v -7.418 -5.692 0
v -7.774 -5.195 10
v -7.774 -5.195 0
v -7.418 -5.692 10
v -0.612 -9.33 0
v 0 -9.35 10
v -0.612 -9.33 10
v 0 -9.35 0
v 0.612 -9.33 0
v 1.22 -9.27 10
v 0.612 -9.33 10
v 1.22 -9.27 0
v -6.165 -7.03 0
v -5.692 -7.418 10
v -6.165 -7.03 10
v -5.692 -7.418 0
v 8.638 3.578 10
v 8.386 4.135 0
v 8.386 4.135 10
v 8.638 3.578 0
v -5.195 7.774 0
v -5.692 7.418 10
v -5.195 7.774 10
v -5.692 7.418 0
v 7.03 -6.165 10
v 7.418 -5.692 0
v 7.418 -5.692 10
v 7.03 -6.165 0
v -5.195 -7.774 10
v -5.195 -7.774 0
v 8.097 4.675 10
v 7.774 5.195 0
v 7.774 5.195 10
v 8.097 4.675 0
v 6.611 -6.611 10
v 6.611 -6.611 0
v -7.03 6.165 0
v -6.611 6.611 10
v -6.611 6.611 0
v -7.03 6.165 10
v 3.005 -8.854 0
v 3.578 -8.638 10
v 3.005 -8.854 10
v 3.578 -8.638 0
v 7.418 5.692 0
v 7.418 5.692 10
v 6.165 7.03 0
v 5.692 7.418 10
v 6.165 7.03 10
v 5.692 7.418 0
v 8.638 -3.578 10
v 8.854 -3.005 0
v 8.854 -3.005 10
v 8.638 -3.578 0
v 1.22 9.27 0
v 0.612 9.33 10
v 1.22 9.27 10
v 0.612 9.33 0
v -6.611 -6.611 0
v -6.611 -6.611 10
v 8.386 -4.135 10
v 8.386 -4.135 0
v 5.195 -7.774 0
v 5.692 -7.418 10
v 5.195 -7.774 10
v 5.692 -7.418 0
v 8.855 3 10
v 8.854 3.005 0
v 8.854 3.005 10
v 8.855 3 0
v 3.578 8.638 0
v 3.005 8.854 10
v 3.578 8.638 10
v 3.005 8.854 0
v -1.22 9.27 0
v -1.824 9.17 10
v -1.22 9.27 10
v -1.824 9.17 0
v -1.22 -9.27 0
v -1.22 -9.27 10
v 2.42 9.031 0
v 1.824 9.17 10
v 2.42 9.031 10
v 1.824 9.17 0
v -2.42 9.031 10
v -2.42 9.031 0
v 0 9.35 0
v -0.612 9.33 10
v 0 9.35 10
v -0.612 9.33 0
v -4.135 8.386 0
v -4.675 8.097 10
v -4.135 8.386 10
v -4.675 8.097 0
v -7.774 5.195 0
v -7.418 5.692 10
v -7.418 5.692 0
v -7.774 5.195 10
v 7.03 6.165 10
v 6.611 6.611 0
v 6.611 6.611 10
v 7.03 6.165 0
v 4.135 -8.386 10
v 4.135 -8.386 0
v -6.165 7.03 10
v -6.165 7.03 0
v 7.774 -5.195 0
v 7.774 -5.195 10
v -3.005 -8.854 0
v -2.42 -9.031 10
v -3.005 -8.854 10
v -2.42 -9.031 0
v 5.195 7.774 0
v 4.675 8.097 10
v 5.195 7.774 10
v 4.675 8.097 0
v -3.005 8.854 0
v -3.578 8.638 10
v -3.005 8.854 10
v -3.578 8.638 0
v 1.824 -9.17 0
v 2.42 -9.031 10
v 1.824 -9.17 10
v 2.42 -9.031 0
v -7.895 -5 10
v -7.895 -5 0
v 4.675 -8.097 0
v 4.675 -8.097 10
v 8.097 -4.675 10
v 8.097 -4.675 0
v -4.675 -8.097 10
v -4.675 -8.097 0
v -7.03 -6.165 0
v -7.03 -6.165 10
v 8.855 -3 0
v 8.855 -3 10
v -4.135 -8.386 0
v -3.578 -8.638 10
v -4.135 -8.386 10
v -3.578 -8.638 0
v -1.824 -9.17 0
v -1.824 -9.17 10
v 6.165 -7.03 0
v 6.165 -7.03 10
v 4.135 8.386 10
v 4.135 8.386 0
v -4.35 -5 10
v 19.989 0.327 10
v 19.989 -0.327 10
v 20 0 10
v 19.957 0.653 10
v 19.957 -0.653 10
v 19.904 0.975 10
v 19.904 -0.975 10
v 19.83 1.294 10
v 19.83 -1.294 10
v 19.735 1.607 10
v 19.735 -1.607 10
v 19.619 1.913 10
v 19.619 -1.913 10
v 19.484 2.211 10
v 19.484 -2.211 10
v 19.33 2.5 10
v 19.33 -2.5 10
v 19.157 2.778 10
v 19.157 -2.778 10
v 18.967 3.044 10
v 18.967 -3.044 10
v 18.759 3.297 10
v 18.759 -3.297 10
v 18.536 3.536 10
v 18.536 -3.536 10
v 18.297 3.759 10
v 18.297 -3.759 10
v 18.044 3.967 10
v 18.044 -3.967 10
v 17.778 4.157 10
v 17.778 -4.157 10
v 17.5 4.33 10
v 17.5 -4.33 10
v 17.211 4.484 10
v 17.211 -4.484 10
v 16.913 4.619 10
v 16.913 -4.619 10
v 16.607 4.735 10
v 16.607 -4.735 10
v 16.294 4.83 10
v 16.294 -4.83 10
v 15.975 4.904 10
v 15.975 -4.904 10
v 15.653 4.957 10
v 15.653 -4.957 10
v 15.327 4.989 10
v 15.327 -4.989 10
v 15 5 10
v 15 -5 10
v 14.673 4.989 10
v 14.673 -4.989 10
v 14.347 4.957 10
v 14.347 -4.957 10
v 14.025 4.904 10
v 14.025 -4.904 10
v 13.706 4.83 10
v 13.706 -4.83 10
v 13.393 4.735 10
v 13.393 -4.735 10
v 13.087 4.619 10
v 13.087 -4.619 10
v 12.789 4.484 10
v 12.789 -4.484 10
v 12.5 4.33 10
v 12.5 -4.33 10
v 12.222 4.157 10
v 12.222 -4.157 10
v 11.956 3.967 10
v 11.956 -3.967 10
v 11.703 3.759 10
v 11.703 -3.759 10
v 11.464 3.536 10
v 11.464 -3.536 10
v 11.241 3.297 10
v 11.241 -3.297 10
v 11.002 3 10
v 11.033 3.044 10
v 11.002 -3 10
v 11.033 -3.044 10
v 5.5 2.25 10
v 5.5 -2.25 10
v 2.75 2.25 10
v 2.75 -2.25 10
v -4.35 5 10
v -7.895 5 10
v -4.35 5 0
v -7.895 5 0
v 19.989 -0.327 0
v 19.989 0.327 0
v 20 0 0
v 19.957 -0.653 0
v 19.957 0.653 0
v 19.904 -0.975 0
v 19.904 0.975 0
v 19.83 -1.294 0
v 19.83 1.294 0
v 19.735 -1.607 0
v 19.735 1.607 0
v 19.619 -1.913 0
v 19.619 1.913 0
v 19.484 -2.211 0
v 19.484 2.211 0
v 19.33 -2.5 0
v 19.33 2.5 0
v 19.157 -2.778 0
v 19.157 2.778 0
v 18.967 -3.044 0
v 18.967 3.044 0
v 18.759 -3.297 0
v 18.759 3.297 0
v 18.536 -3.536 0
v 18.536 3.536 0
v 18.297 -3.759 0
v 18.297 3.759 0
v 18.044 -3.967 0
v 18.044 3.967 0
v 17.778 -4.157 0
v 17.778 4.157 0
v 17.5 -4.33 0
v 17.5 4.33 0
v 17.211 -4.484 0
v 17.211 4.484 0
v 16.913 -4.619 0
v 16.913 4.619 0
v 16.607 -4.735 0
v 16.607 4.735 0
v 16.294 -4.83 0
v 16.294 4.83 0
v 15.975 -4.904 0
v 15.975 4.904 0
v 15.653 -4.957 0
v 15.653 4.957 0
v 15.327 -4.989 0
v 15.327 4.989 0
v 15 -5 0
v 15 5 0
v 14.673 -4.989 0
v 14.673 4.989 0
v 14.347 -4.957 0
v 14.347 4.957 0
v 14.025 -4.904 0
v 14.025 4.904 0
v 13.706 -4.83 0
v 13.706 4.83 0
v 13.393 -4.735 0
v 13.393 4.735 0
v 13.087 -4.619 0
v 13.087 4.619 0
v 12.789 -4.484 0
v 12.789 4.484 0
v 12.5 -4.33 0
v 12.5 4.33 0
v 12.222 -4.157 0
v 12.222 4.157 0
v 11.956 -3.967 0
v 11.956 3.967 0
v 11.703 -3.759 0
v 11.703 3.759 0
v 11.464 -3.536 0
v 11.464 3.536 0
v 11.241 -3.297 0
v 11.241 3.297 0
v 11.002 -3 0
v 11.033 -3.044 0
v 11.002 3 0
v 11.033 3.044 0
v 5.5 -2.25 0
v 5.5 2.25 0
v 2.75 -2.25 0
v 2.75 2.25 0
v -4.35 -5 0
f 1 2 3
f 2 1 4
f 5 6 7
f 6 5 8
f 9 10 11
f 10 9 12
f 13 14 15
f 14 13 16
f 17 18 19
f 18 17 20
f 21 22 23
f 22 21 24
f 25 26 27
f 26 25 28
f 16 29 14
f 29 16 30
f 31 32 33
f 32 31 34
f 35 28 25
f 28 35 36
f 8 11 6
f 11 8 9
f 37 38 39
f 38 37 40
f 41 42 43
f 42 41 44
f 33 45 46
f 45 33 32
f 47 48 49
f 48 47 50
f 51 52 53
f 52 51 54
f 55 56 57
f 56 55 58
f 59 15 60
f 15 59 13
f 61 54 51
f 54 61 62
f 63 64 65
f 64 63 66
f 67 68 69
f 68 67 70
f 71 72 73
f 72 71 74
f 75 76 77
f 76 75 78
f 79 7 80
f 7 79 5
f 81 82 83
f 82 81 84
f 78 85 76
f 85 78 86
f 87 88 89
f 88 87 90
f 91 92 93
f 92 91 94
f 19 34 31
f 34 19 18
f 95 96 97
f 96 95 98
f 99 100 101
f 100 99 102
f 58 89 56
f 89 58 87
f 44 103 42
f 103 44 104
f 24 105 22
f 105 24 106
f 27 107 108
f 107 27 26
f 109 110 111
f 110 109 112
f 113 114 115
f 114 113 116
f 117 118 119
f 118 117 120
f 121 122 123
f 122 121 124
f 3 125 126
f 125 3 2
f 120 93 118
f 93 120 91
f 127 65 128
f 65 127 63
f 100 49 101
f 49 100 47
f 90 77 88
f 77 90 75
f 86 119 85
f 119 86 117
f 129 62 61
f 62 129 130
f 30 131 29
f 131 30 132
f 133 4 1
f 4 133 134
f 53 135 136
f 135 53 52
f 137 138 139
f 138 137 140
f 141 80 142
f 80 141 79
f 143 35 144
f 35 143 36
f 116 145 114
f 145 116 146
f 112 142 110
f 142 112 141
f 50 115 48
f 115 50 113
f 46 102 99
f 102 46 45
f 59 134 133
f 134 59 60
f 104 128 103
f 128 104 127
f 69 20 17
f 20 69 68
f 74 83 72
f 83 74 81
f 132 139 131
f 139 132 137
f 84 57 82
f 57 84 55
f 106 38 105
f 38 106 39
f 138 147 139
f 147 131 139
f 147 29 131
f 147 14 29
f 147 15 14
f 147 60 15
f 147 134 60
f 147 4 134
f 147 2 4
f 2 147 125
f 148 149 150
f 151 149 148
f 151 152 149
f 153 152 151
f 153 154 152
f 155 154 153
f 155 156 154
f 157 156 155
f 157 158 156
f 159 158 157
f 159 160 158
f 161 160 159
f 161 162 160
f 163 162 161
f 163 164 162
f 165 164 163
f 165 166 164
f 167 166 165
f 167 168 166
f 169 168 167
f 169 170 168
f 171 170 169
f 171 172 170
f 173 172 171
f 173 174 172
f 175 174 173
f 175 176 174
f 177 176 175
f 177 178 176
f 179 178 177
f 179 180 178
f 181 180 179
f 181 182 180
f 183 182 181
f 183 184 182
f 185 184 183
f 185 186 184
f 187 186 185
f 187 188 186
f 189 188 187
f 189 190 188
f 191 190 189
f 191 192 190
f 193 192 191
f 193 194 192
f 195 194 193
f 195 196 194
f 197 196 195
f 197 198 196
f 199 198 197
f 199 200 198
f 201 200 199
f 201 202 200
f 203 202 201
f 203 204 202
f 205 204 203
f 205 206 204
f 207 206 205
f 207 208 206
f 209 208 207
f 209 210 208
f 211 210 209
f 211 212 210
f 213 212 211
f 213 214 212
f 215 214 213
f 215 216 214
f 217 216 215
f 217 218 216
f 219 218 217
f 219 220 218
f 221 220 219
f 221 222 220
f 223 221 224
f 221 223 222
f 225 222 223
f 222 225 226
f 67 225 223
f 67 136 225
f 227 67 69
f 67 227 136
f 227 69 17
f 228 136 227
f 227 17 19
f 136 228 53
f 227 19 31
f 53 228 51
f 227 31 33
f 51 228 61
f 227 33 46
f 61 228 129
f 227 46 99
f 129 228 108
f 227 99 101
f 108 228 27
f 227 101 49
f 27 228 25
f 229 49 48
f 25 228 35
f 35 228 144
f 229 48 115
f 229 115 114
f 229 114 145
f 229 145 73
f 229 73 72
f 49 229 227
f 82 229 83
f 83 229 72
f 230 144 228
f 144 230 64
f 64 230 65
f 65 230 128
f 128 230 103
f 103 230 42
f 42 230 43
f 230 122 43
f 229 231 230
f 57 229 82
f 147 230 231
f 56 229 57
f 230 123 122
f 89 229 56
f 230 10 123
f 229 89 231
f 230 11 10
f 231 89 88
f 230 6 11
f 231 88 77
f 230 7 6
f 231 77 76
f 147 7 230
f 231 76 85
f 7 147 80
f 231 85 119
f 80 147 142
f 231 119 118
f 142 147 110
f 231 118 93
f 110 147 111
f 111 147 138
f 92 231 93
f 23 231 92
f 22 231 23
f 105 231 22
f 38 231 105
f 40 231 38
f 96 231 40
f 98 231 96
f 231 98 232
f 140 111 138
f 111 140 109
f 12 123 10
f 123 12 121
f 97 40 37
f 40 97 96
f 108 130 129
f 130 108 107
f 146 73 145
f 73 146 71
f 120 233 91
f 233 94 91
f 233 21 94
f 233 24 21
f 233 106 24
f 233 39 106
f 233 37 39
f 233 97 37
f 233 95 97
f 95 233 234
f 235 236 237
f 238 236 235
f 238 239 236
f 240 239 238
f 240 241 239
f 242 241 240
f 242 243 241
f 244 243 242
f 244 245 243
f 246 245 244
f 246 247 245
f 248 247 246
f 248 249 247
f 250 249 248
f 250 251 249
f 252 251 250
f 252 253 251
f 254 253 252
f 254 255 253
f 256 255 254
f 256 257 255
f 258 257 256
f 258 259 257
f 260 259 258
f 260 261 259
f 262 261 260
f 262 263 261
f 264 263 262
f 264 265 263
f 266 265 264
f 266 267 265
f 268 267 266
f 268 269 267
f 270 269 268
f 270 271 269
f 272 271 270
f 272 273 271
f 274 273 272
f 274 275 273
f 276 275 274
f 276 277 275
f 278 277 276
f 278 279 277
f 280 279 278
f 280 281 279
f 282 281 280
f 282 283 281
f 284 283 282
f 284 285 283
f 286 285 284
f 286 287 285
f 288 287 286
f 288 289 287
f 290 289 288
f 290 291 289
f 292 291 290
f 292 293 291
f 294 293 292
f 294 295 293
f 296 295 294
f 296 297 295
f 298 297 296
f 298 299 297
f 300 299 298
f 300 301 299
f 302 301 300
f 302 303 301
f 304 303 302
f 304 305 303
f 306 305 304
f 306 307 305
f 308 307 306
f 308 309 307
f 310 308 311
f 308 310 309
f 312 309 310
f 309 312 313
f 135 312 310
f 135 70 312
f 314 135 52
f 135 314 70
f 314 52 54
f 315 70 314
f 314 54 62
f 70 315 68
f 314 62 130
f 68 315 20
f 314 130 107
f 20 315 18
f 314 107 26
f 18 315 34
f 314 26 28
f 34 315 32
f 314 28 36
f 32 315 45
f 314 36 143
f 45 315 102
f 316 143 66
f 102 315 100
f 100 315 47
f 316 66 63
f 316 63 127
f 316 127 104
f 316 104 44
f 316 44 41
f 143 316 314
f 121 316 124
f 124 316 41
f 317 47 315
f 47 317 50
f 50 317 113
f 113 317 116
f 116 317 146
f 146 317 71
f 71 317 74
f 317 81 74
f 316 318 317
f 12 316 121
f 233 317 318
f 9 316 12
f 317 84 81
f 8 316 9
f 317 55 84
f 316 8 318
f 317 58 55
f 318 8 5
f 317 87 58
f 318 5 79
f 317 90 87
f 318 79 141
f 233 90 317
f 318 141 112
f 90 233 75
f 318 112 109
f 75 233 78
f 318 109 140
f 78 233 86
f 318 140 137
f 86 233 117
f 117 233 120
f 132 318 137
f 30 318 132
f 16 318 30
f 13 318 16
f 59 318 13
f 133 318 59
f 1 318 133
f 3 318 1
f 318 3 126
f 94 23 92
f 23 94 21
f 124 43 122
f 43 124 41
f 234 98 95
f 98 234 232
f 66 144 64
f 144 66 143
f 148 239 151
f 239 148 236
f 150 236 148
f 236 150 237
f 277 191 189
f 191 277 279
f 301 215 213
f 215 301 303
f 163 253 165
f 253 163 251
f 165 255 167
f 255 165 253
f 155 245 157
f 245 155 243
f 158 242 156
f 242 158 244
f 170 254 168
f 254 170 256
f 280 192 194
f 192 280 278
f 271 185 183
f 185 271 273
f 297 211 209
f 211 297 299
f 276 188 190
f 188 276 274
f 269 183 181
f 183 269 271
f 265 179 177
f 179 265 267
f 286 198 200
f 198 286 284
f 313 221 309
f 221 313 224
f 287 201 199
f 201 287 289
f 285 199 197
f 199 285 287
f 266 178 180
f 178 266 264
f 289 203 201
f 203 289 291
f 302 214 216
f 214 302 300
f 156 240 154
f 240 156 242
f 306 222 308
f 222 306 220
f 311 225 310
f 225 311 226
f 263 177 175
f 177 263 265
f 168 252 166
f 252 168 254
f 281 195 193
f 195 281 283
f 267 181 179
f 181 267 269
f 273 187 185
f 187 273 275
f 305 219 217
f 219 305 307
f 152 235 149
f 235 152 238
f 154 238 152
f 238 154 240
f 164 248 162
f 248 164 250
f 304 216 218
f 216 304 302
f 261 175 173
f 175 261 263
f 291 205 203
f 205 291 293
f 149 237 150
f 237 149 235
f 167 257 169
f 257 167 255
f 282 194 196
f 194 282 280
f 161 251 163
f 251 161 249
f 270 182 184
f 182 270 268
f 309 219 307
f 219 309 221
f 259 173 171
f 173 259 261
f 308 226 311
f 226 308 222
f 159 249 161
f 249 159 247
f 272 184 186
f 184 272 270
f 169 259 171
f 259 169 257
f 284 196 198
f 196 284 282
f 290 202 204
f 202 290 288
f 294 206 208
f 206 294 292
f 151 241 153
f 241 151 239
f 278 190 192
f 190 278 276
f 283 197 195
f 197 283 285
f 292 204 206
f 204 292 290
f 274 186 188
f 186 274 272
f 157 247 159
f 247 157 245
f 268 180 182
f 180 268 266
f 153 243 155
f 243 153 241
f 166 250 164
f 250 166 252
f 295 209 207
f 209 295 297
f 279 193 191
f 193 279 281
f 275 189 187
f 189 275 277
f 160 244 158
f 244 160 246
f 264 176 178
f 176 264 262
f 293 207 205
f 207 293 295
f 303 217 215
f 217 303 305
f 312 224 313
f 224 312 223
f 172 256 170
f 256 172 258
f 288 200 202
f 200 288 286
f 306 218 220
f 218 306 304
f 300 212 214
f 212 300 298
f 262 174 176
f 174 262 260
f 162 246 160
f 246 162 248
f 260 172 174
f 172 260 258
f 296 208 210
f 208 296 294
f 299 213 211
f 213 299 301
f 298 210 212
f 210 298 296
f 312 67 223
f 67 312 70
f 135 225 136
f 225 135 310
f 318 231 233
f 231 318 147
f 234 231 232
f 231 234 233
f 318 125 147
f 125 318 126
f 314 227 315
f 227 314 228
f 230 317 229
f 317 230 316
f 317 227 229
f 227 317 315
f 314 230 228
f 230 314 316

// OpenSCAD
// Snap-on tubing clip for 12.7 mm lab stand rod
// Print orientation: flat on bed, extrusion along +Z

$fn = 96;

// ---- Dimensions (mm) ----
stand_id     = 12.7;   // stand rod inner diameter
stand_wall   = 3;      // stand ring wall thickness
stand_od     = stand_id + 2 * stand_wall;  // 18.7 outer diameter
stand_cut    = 10;     // stand ring opening width (-X side)

tube_id      = 6;      // tubing inner diameter
tube_wall    = 2;      // tubing wall thickness
tube_od      = tube_id + 2 * tube_wall;    // 10 outer diameter
tube_cut     = 4.5;    // tubing ring opening width (+X side)

bridge_x0    = 8;      // bridge start in X
bridge_x1    = 12;     // bridge end in X
bridge_w     = 6;      // bridge width in Y

eps          = 0.5;    // cutter overshoot past faces

// ---- Model ----
difference() {
    union() {
        // Stand rod ring
        cylinder(d = stand_od, h = 10);

        // Tubing ring
        translate([15, 0, 0])
            cylinder(d = tube_od, h = 10);

        // Solid bridge
        translate([bridge_x0, -bridge_w / 2, 0])
            cube([bridge_x1 - bridge_x0, bridge_w, 10]);
    }

    // Stand ring opening (x < 0, -5 < y < 5)
    translate([-stand_od / 2 - eps, -stand_cut / 2, -eps])
        cube([stand_cut / 2 + eps, stand_cut, 10 + 2 * eps]);

    // Tubing ring opening (x > 15, -2.25 < y < 2.25)
    translate([tube_od / 2 - tube_cut / 2, -tube_cut / 2, -eps])
        cube([tube_cut / 2 + eps, tube_cut, 10 + 2 * eps]);
}
